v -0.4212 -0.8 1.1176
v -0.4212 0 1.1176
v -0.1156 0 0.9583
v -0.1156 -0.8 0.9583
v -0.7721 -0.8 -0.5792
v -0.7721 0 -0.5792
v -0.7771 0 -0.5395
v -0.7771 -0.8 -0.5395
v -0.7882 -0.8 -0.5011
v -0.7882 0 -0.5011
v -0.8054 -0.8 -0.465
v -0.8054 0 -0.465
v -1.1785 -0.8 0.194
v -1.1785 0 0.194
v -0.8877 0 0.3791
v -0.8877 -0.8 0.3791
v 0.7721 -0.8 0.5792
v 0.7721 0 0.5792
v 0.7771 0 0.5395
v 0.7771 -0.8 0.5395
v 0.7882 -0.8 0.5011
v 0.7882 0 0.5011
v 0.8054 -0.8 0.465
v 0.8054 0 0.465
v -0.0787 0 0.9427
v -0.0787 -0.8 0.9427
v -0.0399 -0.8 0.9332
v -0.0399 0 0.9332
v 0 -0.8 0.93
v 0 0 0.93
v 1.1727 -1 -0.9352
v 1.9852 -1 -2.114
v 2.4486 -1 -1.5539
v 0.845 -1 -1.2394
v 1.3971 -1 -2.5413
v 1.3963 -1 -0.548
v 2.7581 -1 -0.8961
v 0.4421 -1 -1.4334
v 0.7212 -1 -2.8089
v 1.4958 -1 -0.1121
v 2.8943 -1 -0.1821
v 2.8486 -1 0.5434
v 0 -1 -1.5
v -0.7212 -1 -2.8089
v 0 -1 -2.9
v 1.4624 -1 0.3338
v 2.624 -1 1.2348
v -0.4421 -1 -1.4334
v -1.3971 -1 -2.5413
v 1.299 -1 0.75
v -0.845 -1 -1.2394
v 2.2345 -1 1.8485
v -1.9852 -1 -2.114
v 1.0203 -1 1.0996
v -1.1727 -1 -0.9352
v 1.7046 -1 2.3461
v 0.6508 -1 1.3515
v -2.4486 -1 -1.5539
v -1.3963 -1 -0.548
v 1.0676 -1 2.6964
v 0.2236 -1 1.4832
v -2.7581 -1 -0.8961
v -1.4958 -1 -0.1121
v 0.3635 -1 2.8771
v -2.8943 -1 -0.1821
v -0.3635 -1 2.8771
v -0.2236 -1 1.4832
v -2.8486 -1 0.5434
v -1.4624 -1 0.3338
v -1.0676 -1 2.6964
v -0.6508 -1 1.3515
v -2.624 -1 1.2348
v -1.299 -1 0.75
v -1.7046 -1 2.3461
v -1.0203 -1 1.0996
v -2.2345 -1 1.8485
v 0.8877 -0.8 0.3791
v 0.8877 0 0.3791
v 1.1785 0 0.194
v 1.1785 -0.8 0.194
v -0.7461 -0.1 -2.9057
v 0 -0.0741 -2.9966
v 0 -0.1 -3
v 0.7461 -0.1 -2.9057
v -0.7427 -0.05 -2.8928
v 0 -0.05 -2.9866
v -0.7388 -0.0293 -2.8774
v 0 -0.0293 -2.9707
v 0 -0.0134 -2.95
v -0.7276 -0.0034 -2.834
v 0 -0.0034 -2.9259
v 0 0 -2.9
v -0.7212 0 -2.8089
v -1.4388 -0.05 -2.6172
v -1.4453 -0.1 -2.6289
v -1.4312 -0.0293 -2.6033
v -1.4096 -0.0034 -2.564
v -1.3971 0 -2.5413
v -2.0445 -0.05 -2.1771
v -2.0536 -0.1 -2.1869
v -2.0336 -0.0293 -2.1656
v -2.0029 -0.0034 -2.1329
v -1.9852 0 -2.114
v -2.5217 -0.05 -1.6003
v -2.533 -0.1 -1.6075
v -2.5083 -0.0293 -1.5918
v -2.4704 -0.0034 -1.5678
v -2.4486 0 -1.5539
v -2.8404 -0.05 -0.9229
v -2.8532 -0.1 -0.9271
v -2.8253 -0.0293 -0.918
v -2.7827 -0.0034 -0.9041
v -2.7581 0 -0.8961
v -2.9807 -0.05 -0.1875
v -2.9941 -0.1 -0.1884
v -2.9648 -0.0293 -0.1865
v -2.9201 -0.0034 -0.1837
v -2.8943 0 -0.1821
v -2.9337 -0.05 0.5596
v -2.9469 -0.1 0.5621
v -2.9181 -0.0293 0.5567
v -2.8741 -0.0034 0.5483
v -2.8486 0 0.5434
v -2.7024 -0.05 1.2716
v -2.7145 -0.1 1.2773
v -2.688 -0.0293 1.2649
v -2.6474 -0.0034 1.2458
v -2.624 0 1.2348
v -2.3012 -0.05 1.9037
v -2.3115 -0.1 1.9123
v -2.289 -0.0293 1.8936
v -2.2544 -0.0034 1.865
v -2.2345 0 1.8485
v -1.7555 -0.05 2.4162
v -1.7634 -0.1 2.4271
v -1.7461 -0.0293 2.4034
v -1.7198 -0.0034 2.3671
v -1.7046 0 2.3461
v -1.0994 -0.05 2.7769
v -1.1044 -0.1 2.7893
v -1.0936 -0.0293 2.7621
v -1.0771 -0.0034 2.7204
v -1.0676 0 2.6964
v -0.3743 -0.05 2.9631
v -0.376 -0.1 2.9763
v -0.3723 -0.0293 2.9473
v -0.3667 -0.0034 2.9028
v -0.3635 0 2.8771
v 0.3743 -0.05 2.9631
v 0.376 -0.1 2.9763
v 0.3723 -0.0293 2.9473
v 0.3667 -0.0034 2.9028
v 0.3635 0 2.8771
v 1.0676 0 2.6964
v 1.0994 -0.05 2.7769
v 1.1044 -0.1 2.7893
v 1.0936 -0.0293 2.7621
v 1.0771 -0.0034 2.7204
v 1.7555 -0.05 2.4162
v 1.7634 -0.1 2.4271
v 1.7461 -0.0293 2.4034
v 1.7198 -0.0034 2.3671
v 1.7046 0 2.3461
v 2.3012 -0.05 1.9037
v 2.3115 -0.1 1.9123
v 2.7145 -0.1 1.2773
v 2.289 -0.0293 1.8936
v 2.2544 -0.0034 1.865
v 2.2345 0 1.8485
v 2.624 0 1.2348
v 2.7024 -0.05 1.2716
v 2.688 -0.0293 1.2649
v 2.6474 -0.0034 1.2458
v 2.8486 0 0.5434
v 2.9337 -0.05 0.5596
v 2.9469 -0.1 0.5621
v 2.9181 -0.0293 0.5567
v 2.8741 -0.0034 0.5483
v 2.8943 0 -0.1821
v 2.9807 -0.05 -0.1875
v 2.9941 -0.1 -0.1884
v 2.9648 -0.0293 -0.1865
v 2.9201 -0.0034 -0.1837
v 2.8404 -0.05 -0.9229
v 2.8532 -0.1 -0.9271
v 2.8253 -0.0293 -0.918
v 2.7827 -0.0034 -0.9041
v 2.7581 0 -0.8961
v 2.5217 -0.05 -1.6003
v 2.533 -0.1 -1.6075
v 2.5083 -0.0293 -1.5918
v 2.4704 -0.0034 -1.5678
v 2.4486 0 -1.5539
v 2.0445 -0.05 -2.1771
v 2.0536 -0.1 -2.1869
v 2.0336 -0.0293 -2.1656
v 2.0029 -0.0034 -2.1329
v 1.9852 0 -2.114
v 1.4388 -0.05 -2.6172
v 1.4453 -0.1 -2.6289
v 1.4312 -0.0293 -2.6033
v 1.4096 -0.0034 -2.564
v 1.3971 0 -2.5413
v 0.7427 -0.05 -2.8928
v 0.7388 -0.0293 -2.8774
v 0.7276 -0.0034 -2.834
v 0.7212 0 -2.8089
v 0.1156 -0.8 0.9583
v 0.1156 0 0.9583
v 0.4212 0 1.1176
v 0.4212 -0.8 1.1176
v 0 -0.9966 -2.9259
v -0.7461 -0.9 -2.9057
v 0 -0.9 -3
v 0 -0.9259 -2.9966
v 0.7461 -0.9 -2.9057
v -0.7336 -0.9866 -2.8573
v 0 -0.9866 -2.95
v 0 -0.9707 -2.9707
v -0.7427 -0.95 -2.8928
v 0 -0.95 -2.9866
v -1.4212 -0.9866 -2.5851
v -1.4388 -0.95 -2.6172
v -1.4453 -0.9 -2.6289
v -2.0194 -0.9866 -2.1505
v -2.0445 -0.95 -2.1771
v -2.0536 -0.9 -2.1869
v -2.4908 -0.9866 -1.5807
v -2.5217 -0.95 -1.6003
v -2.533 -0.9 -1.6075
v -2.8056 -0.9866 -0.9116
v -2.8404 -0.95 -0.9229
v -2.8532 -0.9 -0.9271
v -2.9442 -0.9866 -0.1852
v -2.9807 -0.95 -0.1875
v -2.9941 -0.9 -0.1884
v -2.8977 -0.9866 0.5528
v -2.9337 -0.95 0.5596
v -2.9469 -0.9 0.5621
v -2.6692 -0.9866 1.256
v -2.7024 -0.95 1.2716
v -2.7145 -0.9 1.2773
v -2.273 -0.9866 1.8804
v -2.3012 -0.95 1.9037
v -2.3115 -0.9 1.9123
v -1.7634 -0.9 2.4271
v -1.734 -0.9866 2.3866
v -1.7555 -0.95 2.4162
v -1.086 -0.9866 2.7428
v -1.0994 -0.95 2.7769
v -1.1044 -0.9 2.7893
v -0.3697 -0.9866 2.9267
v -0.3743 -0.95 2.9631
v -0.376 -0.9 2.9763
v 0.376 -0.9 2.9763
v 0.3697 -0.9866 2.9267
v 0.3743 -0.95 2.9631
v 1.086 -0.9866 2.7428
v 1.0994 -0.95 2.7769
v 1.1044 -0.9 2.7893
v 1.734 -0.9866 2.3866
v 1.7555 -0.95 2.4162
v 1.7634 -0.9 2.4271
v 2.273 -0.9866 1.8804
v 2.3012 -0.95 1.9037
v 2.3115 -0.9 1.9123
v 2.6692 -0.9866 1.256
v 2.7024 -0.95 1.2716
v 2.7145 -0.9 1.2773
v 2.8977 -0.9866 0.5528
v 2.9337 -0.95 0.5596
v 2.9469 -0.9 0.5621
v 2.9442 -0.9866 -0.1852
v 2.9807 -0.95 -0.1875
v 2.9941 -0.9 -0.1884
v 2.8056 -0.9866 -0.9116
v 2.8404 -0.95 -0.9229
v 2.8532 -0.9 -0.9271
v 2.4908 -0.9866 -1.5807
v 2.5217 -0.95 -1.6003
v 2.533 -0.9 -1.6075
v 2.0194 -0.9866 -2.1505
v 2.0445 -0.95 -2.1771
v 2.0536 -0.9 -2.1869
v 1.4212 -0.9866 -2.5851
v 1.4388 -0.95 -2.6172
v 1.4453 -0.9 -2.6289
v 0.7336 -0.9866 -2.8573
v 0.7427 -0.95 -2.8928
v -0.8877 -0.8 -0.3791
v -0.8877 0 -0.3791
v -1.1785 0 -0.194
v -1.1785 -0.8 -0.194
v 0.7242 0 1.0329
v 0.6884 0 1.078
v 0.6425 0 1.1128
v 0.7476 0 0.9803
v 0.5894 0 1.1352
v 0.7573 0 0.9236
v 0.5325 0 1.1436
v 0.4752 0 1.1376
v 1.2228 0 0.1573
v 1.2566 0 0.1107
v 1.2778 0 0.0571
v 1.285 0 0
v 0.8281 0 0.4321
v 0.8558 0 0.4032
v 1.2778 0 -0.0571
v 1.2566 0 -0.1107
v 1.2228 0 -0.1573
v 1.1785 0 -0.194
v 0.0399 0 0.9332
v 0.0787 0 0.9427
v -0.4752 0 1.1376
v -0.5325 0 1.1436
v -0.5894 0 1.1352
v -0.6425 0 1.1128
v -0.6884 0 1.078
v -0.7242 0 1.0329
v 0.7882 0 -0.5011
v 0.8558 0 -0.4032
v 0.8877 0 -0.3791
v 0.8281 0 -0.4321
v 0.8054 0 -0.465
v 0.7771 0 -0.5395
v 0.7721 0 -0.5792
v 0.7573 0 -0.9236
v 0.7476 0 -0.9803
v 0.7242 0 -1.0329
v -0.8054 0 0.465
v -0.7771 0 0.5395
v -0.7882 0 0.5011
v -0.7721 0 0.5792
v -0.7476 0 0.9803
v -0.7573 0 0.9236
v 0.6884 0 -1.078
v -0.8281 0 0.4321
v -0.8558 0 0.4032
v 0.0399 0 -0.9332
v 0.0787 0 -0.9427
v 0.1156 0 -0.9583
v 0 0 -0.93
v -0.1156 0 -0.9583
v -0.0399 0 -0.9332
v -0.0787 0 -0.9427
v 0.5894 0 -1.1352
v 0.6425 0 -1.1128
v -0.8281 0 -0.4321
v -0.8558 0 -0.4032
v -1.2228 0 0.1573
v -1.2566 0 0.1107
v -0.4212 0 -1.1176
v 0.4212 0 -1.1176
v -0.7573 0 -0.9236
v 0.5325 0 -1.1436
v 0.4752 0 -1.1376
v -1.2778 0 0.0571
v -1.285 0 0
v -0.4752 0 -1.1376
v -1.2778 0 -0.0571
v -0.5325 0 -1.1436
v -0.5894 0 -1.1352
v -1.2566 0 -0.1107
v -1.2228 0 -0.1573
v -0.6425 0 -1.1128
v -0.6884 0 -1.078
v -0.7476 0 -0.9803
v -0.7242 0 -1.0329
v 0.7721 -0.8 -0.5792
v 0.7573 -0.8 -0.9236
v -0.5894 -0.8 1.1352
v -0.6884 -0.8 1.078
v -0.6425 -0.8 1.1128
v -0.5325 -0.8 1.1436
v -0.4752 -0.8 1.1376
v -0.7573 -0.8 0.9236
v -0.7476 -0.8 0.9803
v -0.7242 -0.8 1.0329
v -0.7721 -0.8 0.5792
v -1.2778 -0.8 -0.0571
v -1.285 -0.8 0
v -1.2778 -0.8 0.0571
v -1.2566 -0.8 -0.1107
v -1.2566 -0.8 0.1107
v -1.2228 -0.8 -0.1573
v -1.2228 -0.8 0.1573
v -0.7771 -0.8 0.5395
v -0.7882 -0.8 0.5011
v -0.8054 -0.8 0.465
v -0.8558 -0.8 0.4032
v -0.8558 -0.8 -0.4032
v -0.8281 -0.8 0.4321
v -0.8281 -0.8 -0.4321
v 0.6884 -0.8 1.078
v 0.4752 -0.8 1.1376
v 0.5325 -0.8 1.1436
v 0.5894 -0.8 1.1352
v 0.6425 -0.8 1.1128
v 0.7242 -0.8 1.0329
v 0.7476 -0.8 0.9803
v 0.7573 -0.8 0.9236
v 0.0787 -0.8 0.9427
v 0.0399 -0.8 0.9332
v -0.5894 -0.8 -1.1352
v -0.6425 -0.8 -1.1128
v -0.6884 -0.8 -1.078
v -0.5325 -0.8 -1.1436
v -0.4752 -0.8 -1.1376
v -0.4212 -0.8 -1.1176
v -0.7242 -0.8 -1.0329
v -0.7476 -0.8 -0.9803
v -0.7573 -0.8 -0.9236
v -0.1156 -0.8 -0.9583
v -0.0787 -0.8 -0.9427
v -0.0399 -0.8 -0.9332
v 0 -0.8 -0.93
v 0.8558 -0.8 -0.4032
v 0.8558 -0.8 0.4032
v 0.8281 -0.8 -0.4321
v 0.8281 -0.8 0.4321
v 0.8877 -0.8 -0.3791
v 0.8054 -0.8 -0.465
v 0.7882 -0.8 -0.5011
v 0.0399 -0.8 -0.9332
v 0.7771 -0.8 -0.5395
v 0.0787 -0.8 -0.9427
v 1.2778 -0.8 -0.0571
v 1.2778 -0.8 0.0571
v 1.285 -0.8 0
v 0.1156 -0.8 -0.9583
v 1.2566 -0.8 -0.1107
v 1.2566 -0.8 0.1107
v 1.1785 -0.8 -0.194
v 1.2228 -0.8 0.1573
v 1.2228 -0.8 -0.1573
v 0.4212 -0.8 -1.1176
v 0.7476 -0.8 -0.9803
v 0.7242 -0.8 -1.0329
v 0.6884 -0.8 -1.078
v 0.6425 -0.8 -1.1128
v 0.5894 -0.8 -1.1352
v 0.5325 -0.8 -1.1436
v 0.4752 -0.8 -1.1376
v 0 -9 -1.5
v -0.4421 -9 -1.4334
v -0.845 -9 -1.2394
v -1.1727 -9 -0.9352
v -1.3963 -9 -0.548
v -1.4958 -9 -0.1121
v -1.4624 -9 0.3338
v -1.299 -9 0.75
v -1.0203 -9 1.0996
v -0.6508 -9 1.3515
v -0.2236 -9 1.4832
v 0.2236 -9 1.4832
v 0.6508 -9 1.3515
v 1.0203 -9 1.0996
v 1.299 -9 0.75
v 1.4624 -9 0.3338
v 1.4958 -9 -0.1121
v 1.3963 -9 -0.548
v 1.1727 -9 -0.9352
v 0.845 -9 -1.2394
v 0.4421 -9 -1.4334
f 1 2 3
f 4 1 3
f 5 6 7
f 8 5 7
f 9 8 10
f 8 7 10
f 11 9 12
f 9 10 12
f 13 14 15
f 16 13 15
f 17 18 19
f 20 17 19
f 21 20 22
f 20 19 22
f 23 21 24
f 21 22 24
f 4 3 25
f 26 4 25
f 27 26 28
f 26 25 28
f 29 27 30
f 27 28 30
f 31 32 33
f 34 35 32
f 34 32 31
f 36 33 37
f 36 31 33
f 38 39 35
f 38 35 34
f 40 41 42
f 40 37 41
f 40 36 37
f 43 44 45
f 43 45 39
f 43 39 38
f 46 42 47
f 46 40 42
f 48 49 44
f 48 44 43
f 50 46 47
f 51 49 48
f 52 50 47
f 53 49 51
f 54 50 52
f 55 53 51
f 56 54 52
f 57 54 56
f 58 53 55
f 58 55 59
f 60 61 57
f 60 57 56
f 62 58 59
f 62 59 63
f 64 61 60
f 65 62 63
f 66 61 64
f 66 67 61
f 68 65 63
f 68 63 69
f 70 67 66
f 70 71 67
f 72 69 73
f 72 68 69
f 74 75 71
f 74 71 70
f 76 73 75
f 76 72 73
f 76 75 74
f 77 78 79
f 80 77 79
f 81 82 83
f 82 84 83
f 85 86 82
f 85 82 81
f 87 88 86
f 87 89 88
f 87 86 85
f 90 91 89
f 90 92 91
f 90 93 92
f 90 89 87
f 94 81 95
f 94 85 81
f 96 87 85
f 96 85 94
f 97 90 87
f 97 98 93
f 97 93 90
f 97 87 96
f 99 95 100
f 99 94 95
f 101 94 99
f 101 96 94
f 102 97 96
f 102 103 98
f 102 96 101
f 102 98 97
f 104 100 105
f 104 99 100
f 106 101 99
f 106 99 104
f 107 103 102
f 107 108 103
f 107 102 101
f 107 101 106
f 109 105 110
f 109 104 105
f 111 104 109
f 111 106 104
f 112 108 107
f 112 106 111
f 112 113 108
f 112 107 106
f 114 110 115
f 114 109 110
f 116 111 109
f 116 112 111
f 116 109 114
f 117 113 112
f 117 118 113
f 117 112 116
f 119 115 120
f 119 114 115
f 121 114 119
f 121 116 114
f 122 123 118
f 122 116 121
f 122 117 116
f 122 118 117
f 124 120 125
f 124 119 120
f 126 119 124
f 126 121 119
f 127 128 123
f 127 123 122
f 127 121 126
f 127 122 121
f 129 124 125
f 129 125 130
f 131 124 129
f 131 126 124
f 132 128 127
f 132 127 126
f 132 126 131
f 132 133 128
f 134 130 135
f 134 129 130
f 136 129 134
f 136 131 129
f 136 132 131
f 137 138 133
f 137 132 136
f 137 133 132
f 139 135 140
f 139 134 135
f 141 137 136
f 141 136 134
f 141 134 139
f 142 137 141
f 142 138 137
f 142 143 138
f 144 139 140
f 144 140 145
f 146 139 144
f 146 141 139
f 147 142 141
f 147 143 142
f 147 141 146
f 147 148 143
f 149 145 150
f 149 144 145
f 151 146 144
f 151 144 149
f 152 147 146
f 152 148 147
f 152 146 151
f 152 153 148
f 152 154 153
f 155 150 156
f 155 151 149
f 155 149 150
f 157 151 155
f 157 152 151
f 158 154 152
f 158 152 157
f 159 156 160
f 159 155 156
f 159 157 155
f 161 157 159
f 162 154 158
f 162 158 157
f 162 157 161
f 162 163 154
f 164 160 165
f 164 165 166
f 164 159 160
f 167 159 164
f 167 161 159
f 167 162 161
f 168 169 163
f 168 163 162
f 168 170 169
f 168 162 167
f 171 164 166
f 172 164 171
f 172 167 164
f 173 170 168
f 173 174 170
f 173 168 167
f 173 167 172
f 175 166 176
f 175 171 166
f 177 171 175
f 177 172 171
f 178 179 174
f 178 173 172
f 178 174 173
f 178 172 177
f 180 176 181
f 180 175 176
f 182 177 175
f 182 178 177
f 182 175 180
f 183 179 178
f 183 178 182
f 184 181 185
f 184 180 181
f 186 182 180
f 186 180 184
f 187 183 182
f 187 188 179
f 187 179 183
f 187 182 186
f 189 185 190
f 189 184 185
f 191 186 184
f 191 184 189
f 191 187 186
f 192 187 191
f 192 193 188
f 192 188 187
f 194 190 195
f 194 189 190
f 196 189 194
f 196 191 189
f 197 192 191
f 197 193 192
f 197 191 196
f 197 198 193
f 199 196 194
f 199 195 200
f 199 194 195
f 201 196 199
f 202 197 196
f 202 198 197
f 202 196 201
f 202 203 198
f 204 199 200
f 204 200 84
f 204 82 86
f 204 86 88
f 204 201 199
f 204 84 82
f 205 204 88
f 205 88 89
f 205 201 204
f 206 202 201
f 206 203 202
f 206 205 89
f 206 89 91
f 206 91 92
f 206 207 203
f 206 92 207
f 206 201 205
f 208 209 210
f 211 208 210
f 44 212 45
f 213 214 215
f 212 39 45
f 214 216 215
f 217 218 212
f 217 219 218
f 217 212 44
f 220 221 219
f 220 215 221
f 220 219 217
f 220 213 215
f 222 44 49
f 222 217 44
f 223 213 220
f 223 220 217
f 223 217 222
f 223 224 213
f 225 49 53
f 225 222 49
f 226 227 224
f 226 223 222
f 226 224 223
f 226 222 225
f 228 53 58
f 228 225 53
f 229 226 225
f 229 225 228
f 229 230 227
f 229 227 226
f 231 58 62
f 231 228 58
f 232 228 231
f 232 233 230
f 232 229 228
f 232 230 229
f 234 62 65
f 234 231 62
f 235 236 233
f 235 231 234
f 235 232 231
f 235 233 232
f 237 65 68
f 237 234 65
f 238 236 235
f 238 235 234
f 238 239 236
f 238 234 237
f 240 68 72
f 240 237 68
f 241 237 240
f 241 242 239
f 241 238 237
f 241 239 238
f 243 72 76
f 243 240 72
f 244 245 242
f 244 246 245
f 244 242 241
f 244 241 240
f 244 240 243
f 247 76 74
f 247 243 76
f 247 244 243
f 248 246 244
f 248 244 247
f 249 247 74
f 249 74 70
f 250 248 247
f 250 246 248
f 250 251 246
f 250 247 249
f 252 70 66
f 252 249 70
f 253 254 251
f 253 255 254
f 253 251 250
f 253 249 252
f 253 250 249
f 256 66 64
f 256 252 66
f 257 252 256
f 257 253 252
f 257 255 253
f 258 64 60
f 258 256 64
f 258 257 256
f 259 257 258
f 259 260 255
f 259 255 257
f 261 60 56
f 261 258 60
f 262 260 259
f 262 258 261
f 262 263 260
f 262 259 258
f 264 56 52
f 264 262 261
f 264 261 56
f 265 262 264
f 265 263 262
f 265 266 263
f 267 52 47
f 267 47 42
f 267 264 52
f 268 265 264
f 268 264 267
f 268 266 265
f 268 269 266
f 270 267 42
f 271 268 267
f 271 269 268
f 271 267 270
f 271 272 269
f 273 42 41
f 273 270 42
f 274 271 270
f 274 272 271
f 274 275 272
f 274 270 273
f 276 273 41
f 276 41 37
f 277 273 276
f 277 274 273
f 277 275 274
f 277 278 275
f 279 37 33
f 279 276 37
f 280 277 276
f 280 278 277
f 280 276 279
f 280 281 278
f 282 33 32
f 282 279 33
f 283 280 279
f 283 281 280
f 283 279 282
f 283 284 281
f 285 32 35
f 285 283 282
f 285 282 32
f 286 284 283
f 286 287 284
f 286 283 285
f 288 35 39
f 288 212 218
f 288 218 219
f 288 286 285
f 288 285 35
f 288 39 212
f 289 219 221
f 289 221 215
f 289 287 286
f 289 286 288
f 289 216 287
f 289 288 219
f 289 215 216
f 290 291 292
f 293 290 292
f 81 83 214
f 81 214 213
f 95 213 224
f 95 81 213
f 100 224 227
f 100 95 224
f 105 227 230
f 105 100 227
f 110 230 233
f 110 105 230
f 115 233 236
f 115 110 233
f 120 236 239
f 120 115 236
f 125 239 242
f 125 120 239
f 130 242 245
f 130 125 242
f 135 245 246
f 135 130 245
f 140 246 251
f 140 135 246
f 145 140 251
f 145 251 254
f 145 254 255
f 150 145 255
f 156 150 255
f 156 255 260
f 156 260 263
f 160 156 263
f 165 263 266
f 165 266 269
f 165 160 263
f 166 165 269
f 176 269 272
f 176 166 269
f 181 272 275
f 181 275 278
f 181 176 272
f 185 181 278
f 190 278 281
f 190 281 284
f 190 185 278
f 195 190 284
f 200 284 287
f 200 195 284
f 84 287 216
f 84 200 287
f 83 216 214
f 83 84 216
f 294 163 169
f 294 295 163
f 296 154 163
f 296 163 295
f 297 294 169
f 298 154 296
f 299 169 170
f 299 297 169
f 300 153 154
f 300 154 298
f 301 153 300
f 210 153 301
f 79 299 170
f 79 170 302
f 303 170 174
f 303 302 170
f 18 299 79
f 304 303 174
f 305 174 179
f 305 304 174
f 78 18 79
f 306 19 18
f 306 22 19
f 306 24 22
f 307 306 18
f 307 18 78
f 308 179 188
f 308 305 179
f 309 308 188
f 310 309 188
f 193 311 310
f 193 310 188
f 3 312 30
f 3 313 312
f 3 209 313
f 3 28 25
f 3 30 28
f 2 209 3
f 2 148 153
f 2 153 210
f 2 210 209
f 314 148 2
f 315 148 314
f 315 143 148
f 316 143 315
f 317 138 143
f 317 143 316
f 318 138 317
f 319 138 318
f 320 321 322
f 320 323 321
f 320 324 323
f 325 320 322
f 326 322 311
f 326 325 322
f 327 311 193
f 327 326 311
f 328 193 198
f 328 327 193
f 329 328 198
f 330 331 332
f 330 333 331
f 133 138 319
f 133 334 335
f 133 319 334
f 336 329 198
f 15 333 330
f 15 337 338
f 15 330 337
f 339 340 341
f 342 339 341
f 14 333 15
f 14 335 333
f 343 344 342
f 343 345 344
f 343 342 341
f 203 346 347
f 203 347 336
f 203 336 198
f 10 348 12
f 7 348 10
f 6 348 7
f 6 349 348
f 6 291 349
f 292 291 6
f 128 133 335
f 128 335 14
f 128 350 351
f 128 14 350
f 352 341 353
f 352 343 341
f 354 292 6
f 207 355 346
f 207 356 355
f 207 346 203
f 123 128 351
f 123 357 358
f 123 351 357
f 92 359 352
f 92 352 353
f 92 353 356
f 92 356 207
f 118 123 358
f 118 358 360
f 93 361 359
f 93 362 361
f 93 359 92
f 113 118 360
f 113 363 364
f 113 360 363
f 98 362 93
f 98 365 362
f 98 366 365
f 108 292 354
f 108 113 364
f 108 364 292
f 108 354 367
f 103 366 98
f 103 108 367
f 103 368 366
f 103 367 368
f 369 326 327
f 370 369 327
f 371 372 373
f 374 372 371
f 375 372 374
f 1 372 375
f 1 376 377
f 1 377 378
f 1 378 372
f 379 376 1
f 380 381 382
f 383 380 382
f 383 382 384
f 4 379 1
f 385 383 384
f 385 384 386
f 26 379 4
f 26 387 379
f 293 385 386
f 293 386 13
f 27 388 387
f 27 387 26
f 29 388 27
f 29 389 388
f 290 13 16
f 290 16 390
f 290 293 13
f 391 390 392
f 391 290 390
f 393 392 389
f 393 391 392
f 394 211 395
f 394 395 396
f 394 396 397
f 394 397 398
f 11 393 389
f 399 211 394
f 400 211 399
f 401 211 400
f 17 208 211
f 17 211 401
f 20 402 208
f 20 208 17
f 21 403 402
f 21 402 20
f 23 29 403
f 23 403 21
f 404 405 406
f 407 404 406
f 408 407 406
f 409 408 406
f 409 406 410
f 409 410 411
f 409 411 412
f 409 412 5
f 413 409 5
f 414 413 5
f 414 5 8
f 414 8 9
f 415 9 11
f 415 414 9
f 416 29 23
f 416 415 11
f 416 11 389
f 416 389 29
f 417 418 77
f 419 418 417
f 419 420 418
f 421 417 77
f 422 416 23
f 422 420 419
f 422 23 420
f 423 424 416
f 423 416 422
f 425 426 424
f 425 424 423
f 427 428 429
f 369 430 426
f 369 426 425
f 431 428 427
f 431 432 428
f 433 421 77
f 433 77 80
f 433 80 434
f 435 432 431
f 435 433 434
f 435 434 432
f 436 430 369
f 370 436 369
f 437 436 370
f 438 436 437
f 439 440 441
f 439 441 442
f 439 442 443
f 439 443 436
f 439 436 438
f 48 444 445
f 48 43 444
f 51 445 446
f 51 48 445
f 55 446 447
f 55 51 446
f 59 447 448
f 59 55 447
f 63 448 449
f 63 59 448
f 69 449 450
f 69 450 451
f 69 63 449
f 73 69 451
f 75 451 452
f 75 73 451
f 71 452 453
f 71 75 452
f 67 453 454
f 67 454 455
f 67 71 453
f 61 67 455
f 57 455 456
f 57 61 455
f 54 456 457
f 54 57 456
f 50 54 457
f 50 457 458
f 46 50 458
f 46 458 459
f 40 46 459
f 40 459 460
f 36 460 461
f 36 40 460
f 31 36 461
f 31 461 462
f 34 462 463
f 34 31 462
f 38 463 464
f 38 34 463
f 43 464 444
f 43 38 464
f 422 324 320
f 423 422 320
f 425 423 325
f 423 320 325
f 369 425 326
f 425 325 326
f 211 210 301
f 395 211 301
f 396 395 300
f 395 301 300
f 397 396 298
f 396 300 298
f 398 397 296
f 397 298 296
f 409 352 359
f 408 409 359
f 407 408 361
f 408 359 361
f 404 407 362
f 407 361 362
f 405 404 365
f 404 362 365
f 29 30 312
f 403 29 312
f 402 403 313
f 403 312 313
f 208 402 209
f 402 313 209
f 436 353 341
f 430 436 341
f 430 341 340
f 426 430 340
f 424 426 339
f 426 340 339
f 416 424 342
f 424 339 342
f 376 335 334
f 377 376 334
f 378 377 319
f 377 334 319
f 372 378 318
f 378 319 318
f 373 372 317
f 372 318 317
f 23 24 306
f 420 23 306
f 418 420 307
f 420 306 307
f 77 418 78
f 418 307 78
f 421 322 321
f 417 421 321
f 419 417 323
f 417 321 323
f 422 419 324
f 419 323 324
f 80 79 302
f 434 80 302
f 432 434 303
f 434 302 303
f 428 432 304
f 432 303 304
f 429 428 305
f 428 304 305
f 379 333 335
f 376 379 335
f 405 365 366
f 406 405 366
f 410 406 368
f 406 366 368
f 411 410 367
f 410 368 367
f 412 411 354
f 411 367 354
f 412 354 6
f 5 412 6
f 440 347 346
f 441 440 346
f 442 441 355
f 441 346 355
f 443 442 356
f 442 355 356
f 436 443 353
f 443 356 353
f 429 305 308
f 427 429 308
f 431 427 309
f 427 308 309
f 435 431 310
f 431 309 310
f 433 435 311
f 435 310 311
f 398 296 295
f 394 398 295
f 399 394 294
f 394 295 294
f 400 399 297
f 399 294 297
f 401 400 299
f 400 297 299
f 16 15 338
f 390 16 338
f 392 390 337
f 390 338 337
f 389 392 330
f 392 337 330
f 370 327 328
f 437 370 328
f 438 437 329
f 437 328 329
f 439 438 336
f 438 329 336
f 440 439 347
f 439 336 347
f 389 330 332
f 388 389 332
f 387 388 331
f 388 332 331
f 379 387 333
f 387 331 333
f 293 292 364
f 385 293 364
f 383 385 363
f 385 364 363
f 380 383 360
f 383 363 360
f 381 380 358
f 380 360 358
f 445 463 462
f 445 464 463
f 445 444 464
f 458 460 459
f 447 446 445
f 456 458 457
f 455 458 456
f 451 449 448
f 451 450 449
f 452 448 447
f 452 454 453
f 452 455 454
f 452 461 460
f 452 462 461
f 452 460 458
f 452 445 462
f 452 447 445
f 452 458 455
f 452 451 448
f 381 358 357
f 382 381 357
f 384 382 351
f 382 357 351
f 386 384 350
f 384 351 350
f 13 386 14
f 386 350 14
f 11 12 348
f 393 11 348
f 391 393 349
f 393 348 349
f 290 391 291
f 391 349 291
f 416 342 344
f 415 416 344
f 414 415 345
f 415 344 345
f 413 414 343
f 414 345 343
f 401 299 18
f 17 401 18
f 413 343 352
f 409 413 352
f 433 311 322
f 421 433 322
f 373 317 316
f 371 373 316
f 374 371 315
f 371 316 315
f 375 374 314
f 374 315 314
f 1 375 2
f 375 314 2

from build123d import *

# Parameters (mm, degrees)
FILLET1_R          = 0.1
SKETCH2_R          = 0.93
CUT_EXTRUDE1_DEPTH = 0.8


with BuildPart() as part:
    # Sketch1 → Revolve1 (revolve)
    with BuildSketch(Plane(origin=(0, 0, 0), x_dir=(0, 0, -1), z_dir=(1, 0, 0))):
        Polygon((0, 0), (0, -9), (1.5, -9), (1.5, -1), (3, -1), (3, 0), align=None)
    revolve(axis=Axis((0, 0, 0), (0, 1, 0)))

    # Fillet1
    fillet1_edges = [part.edges().sort_by_distance(p)[0] for p in [
        (0, 0, 3),
        (0, -1, 3),
    ]]
    fillet(fillet1_edges, radius=FILLET1_R)

    # Sketch2 → Cut-Extrude1 (cut)
    with BuildSketch(Plane(origin=(0, 0, 0), x_dir=(1, 0, 0), z_dir=(0, 1, 0))):
        Circle(SKETCH2_R)
        with BuildLine():
            ThreePointArc((0.757286248, 0.923570431), (0.724160575, 1.032923804), (0.6425, 1.112842644))
            ThreePointArc((0.6425, 1.112842644), (0.532457967, 1.143603357), (0.421192331, 1.117614344))
            Line((0.421192331, 1.117614344), (0.115551814, 0.958307018))
            ThreePointArc((0.115551814, 0.958307018), (0.059484261, 0.937179855), (0, 0.93))
            ThreePointArc((0, 0.93), (0.465000014, 0.805403617), (0.805403642, 0.464999972))
            ThreePointArc((0.805403642, 0.464999972), (0.781879437, 0.520104793), (0.772142315, 0.579224316))
            Line((0.772142315, 0.579224316), (0.757286248, 0.923570431))
        make_face()
        with BuildLine():
            ThreePointArc((-0.6425, 1.112842644), (-0.724160575, 1.032923804), (-0.757286248, 0.923570431))
            Line((-0.757286248, 0.923570431), (-0.772142315, 0.579224316))
            ThreePointArc((-0.772142315, 0.579224316), (-0.781879432, 0.52010481), (-0.805403624, 0.465000003))
            ThreePointArc((-0.805403624, 0.465000003), (-0.464999999, 0.805403626), (0, 0.93))
            ThreePointArc((0, 0.93), (-0.059484261, 0.937179855), (-0.115551814, 0.958307018))
            Line((-0.115551814, 0.958307018), (-0.421192331, 1.117614344))
            ThreePointArc((-0.421192331, 1.117614344), (-0.532457967, 1.143603357), (-0.6425, 1.112842644))
        make_face()
        with BuildLine():
            ThreePointArc((-0.805403626, -0.464999999), (-0.93, 2e-09), (-0.805403624, 0.465000003))
            ThreePointArc((-0.805403624, 0.465000003), (-0.841363692, 0.417075048), (-0.887694129, 0.379082702))
            Line((-0.887694129, 0.379082702), (-1.178478579, 0.194043914))
            ThreePointArc((-1.178478579, 0.194043914), (-1.256618542, 0.110679553), (-1.285, 0))
            ThreePointArc((-1.285, 0), (-1.256618542, -0.110679553), (-1.178478579, -0.194043914))
            Line((-1.178478579, -0.194043914), (-0.887694129, -0.379082702))
            ThreePointArc((-0.887694129, -0.379082702), (-0.841363693, -0.417075046), (-0.805403626, -0.464999999))
        make_face()
        with BuildLine():
            ThreePointArc((-3e-09, -0.93), (-0.465000002, -0.805403625), (-0.805403626, -0.464999999))
            ThreePointArc((-0.805403626, -0.464999999), (-0.781879432, -0.520104808), (-0.772142315, -0.579224316))
            Line((-0.772142315, -0.579224316), (-0.757286248, -0.923570431))
            ThreePointArc((-0.757286248, -0.923570431), (-0.724160575, -1.032923804), (-0.6425, -1.112842644))
            ThreePointArc((-0.6425, -1.112842644), (-0.532457967, -1.143603357), (-0.421192331, -1.117614344))
            Line((-0.421192331, -1.117614344), (-0.115551814, -0.958307018))
            ThreePointArc((-0.115551814, -0.958307018), (-0.059484262, -0.937179855), (-3e-09, -0.93))
        make_face()
        with BuildLine():
            ThreePointArc((0.805403624, -0.465000003), (0.464999998, -0.805403627), (-3e-09, -0.93))
            ThreePointArc((-3e-09, -0.93), (0.059484259, -0.937179855), (0.115551814, -0.958307018))
            Line((0.115551814, -0.958307018), (0.421192331, -1.117614344))
            ThreePointArc((0.421192331, -1.117614344), (0.532457967, -1.143603357), (0.6425, -1.112842644))
            ThreePointArc((0.6425, -1.112842644), (0.724160575, -1.032923804), (0.757286248, -0.923570431))
            Line((0.757286248, -0.923570431), (0.772142315, -0.579224316))
            ThreePointArc((0.772142315, -0.579224316), (0.781879432, -0.52010481), (0.805403624, -0.465000003))
        make_face()
        with BuildLine():
            ThreePointArc((1.178478579, -0.194043914), (1.256618542, -0.110679553), (1.285, 0))
            ThreePointArc((1.285, 0), (1.256618542, 0.110679553), (1.178478579, 0.194043914))
            Line((1.178478579, 0.194043914), (0.887694129, 0.379082702))
            ThreePointArc((0.887694129, 0.379082702), (0.841363704, 0.417075035), (0.805403642, 0.464999972))
            ThreePointArc((0.805403642, 0.464999972), (0.898311023, 0.240701696), (0.93, 0))
            ThreePointArc((0.93, 0), (0.898311018, -0.240701713), (0.805403624, -0.465000003))
            ThreePointArc((0.805403624, -0.465000003), (0.841363692, -0.417075048), (0.887694129, -0.379082702))
            Line((0.887694129, -0.379082702), (1.178478579, -0.194043914))
        make_face()
    extrude(amount=-CUT_EXTRUDE1_DEPTH, mode=Mode.SUBTRACT)


solid = part.part
